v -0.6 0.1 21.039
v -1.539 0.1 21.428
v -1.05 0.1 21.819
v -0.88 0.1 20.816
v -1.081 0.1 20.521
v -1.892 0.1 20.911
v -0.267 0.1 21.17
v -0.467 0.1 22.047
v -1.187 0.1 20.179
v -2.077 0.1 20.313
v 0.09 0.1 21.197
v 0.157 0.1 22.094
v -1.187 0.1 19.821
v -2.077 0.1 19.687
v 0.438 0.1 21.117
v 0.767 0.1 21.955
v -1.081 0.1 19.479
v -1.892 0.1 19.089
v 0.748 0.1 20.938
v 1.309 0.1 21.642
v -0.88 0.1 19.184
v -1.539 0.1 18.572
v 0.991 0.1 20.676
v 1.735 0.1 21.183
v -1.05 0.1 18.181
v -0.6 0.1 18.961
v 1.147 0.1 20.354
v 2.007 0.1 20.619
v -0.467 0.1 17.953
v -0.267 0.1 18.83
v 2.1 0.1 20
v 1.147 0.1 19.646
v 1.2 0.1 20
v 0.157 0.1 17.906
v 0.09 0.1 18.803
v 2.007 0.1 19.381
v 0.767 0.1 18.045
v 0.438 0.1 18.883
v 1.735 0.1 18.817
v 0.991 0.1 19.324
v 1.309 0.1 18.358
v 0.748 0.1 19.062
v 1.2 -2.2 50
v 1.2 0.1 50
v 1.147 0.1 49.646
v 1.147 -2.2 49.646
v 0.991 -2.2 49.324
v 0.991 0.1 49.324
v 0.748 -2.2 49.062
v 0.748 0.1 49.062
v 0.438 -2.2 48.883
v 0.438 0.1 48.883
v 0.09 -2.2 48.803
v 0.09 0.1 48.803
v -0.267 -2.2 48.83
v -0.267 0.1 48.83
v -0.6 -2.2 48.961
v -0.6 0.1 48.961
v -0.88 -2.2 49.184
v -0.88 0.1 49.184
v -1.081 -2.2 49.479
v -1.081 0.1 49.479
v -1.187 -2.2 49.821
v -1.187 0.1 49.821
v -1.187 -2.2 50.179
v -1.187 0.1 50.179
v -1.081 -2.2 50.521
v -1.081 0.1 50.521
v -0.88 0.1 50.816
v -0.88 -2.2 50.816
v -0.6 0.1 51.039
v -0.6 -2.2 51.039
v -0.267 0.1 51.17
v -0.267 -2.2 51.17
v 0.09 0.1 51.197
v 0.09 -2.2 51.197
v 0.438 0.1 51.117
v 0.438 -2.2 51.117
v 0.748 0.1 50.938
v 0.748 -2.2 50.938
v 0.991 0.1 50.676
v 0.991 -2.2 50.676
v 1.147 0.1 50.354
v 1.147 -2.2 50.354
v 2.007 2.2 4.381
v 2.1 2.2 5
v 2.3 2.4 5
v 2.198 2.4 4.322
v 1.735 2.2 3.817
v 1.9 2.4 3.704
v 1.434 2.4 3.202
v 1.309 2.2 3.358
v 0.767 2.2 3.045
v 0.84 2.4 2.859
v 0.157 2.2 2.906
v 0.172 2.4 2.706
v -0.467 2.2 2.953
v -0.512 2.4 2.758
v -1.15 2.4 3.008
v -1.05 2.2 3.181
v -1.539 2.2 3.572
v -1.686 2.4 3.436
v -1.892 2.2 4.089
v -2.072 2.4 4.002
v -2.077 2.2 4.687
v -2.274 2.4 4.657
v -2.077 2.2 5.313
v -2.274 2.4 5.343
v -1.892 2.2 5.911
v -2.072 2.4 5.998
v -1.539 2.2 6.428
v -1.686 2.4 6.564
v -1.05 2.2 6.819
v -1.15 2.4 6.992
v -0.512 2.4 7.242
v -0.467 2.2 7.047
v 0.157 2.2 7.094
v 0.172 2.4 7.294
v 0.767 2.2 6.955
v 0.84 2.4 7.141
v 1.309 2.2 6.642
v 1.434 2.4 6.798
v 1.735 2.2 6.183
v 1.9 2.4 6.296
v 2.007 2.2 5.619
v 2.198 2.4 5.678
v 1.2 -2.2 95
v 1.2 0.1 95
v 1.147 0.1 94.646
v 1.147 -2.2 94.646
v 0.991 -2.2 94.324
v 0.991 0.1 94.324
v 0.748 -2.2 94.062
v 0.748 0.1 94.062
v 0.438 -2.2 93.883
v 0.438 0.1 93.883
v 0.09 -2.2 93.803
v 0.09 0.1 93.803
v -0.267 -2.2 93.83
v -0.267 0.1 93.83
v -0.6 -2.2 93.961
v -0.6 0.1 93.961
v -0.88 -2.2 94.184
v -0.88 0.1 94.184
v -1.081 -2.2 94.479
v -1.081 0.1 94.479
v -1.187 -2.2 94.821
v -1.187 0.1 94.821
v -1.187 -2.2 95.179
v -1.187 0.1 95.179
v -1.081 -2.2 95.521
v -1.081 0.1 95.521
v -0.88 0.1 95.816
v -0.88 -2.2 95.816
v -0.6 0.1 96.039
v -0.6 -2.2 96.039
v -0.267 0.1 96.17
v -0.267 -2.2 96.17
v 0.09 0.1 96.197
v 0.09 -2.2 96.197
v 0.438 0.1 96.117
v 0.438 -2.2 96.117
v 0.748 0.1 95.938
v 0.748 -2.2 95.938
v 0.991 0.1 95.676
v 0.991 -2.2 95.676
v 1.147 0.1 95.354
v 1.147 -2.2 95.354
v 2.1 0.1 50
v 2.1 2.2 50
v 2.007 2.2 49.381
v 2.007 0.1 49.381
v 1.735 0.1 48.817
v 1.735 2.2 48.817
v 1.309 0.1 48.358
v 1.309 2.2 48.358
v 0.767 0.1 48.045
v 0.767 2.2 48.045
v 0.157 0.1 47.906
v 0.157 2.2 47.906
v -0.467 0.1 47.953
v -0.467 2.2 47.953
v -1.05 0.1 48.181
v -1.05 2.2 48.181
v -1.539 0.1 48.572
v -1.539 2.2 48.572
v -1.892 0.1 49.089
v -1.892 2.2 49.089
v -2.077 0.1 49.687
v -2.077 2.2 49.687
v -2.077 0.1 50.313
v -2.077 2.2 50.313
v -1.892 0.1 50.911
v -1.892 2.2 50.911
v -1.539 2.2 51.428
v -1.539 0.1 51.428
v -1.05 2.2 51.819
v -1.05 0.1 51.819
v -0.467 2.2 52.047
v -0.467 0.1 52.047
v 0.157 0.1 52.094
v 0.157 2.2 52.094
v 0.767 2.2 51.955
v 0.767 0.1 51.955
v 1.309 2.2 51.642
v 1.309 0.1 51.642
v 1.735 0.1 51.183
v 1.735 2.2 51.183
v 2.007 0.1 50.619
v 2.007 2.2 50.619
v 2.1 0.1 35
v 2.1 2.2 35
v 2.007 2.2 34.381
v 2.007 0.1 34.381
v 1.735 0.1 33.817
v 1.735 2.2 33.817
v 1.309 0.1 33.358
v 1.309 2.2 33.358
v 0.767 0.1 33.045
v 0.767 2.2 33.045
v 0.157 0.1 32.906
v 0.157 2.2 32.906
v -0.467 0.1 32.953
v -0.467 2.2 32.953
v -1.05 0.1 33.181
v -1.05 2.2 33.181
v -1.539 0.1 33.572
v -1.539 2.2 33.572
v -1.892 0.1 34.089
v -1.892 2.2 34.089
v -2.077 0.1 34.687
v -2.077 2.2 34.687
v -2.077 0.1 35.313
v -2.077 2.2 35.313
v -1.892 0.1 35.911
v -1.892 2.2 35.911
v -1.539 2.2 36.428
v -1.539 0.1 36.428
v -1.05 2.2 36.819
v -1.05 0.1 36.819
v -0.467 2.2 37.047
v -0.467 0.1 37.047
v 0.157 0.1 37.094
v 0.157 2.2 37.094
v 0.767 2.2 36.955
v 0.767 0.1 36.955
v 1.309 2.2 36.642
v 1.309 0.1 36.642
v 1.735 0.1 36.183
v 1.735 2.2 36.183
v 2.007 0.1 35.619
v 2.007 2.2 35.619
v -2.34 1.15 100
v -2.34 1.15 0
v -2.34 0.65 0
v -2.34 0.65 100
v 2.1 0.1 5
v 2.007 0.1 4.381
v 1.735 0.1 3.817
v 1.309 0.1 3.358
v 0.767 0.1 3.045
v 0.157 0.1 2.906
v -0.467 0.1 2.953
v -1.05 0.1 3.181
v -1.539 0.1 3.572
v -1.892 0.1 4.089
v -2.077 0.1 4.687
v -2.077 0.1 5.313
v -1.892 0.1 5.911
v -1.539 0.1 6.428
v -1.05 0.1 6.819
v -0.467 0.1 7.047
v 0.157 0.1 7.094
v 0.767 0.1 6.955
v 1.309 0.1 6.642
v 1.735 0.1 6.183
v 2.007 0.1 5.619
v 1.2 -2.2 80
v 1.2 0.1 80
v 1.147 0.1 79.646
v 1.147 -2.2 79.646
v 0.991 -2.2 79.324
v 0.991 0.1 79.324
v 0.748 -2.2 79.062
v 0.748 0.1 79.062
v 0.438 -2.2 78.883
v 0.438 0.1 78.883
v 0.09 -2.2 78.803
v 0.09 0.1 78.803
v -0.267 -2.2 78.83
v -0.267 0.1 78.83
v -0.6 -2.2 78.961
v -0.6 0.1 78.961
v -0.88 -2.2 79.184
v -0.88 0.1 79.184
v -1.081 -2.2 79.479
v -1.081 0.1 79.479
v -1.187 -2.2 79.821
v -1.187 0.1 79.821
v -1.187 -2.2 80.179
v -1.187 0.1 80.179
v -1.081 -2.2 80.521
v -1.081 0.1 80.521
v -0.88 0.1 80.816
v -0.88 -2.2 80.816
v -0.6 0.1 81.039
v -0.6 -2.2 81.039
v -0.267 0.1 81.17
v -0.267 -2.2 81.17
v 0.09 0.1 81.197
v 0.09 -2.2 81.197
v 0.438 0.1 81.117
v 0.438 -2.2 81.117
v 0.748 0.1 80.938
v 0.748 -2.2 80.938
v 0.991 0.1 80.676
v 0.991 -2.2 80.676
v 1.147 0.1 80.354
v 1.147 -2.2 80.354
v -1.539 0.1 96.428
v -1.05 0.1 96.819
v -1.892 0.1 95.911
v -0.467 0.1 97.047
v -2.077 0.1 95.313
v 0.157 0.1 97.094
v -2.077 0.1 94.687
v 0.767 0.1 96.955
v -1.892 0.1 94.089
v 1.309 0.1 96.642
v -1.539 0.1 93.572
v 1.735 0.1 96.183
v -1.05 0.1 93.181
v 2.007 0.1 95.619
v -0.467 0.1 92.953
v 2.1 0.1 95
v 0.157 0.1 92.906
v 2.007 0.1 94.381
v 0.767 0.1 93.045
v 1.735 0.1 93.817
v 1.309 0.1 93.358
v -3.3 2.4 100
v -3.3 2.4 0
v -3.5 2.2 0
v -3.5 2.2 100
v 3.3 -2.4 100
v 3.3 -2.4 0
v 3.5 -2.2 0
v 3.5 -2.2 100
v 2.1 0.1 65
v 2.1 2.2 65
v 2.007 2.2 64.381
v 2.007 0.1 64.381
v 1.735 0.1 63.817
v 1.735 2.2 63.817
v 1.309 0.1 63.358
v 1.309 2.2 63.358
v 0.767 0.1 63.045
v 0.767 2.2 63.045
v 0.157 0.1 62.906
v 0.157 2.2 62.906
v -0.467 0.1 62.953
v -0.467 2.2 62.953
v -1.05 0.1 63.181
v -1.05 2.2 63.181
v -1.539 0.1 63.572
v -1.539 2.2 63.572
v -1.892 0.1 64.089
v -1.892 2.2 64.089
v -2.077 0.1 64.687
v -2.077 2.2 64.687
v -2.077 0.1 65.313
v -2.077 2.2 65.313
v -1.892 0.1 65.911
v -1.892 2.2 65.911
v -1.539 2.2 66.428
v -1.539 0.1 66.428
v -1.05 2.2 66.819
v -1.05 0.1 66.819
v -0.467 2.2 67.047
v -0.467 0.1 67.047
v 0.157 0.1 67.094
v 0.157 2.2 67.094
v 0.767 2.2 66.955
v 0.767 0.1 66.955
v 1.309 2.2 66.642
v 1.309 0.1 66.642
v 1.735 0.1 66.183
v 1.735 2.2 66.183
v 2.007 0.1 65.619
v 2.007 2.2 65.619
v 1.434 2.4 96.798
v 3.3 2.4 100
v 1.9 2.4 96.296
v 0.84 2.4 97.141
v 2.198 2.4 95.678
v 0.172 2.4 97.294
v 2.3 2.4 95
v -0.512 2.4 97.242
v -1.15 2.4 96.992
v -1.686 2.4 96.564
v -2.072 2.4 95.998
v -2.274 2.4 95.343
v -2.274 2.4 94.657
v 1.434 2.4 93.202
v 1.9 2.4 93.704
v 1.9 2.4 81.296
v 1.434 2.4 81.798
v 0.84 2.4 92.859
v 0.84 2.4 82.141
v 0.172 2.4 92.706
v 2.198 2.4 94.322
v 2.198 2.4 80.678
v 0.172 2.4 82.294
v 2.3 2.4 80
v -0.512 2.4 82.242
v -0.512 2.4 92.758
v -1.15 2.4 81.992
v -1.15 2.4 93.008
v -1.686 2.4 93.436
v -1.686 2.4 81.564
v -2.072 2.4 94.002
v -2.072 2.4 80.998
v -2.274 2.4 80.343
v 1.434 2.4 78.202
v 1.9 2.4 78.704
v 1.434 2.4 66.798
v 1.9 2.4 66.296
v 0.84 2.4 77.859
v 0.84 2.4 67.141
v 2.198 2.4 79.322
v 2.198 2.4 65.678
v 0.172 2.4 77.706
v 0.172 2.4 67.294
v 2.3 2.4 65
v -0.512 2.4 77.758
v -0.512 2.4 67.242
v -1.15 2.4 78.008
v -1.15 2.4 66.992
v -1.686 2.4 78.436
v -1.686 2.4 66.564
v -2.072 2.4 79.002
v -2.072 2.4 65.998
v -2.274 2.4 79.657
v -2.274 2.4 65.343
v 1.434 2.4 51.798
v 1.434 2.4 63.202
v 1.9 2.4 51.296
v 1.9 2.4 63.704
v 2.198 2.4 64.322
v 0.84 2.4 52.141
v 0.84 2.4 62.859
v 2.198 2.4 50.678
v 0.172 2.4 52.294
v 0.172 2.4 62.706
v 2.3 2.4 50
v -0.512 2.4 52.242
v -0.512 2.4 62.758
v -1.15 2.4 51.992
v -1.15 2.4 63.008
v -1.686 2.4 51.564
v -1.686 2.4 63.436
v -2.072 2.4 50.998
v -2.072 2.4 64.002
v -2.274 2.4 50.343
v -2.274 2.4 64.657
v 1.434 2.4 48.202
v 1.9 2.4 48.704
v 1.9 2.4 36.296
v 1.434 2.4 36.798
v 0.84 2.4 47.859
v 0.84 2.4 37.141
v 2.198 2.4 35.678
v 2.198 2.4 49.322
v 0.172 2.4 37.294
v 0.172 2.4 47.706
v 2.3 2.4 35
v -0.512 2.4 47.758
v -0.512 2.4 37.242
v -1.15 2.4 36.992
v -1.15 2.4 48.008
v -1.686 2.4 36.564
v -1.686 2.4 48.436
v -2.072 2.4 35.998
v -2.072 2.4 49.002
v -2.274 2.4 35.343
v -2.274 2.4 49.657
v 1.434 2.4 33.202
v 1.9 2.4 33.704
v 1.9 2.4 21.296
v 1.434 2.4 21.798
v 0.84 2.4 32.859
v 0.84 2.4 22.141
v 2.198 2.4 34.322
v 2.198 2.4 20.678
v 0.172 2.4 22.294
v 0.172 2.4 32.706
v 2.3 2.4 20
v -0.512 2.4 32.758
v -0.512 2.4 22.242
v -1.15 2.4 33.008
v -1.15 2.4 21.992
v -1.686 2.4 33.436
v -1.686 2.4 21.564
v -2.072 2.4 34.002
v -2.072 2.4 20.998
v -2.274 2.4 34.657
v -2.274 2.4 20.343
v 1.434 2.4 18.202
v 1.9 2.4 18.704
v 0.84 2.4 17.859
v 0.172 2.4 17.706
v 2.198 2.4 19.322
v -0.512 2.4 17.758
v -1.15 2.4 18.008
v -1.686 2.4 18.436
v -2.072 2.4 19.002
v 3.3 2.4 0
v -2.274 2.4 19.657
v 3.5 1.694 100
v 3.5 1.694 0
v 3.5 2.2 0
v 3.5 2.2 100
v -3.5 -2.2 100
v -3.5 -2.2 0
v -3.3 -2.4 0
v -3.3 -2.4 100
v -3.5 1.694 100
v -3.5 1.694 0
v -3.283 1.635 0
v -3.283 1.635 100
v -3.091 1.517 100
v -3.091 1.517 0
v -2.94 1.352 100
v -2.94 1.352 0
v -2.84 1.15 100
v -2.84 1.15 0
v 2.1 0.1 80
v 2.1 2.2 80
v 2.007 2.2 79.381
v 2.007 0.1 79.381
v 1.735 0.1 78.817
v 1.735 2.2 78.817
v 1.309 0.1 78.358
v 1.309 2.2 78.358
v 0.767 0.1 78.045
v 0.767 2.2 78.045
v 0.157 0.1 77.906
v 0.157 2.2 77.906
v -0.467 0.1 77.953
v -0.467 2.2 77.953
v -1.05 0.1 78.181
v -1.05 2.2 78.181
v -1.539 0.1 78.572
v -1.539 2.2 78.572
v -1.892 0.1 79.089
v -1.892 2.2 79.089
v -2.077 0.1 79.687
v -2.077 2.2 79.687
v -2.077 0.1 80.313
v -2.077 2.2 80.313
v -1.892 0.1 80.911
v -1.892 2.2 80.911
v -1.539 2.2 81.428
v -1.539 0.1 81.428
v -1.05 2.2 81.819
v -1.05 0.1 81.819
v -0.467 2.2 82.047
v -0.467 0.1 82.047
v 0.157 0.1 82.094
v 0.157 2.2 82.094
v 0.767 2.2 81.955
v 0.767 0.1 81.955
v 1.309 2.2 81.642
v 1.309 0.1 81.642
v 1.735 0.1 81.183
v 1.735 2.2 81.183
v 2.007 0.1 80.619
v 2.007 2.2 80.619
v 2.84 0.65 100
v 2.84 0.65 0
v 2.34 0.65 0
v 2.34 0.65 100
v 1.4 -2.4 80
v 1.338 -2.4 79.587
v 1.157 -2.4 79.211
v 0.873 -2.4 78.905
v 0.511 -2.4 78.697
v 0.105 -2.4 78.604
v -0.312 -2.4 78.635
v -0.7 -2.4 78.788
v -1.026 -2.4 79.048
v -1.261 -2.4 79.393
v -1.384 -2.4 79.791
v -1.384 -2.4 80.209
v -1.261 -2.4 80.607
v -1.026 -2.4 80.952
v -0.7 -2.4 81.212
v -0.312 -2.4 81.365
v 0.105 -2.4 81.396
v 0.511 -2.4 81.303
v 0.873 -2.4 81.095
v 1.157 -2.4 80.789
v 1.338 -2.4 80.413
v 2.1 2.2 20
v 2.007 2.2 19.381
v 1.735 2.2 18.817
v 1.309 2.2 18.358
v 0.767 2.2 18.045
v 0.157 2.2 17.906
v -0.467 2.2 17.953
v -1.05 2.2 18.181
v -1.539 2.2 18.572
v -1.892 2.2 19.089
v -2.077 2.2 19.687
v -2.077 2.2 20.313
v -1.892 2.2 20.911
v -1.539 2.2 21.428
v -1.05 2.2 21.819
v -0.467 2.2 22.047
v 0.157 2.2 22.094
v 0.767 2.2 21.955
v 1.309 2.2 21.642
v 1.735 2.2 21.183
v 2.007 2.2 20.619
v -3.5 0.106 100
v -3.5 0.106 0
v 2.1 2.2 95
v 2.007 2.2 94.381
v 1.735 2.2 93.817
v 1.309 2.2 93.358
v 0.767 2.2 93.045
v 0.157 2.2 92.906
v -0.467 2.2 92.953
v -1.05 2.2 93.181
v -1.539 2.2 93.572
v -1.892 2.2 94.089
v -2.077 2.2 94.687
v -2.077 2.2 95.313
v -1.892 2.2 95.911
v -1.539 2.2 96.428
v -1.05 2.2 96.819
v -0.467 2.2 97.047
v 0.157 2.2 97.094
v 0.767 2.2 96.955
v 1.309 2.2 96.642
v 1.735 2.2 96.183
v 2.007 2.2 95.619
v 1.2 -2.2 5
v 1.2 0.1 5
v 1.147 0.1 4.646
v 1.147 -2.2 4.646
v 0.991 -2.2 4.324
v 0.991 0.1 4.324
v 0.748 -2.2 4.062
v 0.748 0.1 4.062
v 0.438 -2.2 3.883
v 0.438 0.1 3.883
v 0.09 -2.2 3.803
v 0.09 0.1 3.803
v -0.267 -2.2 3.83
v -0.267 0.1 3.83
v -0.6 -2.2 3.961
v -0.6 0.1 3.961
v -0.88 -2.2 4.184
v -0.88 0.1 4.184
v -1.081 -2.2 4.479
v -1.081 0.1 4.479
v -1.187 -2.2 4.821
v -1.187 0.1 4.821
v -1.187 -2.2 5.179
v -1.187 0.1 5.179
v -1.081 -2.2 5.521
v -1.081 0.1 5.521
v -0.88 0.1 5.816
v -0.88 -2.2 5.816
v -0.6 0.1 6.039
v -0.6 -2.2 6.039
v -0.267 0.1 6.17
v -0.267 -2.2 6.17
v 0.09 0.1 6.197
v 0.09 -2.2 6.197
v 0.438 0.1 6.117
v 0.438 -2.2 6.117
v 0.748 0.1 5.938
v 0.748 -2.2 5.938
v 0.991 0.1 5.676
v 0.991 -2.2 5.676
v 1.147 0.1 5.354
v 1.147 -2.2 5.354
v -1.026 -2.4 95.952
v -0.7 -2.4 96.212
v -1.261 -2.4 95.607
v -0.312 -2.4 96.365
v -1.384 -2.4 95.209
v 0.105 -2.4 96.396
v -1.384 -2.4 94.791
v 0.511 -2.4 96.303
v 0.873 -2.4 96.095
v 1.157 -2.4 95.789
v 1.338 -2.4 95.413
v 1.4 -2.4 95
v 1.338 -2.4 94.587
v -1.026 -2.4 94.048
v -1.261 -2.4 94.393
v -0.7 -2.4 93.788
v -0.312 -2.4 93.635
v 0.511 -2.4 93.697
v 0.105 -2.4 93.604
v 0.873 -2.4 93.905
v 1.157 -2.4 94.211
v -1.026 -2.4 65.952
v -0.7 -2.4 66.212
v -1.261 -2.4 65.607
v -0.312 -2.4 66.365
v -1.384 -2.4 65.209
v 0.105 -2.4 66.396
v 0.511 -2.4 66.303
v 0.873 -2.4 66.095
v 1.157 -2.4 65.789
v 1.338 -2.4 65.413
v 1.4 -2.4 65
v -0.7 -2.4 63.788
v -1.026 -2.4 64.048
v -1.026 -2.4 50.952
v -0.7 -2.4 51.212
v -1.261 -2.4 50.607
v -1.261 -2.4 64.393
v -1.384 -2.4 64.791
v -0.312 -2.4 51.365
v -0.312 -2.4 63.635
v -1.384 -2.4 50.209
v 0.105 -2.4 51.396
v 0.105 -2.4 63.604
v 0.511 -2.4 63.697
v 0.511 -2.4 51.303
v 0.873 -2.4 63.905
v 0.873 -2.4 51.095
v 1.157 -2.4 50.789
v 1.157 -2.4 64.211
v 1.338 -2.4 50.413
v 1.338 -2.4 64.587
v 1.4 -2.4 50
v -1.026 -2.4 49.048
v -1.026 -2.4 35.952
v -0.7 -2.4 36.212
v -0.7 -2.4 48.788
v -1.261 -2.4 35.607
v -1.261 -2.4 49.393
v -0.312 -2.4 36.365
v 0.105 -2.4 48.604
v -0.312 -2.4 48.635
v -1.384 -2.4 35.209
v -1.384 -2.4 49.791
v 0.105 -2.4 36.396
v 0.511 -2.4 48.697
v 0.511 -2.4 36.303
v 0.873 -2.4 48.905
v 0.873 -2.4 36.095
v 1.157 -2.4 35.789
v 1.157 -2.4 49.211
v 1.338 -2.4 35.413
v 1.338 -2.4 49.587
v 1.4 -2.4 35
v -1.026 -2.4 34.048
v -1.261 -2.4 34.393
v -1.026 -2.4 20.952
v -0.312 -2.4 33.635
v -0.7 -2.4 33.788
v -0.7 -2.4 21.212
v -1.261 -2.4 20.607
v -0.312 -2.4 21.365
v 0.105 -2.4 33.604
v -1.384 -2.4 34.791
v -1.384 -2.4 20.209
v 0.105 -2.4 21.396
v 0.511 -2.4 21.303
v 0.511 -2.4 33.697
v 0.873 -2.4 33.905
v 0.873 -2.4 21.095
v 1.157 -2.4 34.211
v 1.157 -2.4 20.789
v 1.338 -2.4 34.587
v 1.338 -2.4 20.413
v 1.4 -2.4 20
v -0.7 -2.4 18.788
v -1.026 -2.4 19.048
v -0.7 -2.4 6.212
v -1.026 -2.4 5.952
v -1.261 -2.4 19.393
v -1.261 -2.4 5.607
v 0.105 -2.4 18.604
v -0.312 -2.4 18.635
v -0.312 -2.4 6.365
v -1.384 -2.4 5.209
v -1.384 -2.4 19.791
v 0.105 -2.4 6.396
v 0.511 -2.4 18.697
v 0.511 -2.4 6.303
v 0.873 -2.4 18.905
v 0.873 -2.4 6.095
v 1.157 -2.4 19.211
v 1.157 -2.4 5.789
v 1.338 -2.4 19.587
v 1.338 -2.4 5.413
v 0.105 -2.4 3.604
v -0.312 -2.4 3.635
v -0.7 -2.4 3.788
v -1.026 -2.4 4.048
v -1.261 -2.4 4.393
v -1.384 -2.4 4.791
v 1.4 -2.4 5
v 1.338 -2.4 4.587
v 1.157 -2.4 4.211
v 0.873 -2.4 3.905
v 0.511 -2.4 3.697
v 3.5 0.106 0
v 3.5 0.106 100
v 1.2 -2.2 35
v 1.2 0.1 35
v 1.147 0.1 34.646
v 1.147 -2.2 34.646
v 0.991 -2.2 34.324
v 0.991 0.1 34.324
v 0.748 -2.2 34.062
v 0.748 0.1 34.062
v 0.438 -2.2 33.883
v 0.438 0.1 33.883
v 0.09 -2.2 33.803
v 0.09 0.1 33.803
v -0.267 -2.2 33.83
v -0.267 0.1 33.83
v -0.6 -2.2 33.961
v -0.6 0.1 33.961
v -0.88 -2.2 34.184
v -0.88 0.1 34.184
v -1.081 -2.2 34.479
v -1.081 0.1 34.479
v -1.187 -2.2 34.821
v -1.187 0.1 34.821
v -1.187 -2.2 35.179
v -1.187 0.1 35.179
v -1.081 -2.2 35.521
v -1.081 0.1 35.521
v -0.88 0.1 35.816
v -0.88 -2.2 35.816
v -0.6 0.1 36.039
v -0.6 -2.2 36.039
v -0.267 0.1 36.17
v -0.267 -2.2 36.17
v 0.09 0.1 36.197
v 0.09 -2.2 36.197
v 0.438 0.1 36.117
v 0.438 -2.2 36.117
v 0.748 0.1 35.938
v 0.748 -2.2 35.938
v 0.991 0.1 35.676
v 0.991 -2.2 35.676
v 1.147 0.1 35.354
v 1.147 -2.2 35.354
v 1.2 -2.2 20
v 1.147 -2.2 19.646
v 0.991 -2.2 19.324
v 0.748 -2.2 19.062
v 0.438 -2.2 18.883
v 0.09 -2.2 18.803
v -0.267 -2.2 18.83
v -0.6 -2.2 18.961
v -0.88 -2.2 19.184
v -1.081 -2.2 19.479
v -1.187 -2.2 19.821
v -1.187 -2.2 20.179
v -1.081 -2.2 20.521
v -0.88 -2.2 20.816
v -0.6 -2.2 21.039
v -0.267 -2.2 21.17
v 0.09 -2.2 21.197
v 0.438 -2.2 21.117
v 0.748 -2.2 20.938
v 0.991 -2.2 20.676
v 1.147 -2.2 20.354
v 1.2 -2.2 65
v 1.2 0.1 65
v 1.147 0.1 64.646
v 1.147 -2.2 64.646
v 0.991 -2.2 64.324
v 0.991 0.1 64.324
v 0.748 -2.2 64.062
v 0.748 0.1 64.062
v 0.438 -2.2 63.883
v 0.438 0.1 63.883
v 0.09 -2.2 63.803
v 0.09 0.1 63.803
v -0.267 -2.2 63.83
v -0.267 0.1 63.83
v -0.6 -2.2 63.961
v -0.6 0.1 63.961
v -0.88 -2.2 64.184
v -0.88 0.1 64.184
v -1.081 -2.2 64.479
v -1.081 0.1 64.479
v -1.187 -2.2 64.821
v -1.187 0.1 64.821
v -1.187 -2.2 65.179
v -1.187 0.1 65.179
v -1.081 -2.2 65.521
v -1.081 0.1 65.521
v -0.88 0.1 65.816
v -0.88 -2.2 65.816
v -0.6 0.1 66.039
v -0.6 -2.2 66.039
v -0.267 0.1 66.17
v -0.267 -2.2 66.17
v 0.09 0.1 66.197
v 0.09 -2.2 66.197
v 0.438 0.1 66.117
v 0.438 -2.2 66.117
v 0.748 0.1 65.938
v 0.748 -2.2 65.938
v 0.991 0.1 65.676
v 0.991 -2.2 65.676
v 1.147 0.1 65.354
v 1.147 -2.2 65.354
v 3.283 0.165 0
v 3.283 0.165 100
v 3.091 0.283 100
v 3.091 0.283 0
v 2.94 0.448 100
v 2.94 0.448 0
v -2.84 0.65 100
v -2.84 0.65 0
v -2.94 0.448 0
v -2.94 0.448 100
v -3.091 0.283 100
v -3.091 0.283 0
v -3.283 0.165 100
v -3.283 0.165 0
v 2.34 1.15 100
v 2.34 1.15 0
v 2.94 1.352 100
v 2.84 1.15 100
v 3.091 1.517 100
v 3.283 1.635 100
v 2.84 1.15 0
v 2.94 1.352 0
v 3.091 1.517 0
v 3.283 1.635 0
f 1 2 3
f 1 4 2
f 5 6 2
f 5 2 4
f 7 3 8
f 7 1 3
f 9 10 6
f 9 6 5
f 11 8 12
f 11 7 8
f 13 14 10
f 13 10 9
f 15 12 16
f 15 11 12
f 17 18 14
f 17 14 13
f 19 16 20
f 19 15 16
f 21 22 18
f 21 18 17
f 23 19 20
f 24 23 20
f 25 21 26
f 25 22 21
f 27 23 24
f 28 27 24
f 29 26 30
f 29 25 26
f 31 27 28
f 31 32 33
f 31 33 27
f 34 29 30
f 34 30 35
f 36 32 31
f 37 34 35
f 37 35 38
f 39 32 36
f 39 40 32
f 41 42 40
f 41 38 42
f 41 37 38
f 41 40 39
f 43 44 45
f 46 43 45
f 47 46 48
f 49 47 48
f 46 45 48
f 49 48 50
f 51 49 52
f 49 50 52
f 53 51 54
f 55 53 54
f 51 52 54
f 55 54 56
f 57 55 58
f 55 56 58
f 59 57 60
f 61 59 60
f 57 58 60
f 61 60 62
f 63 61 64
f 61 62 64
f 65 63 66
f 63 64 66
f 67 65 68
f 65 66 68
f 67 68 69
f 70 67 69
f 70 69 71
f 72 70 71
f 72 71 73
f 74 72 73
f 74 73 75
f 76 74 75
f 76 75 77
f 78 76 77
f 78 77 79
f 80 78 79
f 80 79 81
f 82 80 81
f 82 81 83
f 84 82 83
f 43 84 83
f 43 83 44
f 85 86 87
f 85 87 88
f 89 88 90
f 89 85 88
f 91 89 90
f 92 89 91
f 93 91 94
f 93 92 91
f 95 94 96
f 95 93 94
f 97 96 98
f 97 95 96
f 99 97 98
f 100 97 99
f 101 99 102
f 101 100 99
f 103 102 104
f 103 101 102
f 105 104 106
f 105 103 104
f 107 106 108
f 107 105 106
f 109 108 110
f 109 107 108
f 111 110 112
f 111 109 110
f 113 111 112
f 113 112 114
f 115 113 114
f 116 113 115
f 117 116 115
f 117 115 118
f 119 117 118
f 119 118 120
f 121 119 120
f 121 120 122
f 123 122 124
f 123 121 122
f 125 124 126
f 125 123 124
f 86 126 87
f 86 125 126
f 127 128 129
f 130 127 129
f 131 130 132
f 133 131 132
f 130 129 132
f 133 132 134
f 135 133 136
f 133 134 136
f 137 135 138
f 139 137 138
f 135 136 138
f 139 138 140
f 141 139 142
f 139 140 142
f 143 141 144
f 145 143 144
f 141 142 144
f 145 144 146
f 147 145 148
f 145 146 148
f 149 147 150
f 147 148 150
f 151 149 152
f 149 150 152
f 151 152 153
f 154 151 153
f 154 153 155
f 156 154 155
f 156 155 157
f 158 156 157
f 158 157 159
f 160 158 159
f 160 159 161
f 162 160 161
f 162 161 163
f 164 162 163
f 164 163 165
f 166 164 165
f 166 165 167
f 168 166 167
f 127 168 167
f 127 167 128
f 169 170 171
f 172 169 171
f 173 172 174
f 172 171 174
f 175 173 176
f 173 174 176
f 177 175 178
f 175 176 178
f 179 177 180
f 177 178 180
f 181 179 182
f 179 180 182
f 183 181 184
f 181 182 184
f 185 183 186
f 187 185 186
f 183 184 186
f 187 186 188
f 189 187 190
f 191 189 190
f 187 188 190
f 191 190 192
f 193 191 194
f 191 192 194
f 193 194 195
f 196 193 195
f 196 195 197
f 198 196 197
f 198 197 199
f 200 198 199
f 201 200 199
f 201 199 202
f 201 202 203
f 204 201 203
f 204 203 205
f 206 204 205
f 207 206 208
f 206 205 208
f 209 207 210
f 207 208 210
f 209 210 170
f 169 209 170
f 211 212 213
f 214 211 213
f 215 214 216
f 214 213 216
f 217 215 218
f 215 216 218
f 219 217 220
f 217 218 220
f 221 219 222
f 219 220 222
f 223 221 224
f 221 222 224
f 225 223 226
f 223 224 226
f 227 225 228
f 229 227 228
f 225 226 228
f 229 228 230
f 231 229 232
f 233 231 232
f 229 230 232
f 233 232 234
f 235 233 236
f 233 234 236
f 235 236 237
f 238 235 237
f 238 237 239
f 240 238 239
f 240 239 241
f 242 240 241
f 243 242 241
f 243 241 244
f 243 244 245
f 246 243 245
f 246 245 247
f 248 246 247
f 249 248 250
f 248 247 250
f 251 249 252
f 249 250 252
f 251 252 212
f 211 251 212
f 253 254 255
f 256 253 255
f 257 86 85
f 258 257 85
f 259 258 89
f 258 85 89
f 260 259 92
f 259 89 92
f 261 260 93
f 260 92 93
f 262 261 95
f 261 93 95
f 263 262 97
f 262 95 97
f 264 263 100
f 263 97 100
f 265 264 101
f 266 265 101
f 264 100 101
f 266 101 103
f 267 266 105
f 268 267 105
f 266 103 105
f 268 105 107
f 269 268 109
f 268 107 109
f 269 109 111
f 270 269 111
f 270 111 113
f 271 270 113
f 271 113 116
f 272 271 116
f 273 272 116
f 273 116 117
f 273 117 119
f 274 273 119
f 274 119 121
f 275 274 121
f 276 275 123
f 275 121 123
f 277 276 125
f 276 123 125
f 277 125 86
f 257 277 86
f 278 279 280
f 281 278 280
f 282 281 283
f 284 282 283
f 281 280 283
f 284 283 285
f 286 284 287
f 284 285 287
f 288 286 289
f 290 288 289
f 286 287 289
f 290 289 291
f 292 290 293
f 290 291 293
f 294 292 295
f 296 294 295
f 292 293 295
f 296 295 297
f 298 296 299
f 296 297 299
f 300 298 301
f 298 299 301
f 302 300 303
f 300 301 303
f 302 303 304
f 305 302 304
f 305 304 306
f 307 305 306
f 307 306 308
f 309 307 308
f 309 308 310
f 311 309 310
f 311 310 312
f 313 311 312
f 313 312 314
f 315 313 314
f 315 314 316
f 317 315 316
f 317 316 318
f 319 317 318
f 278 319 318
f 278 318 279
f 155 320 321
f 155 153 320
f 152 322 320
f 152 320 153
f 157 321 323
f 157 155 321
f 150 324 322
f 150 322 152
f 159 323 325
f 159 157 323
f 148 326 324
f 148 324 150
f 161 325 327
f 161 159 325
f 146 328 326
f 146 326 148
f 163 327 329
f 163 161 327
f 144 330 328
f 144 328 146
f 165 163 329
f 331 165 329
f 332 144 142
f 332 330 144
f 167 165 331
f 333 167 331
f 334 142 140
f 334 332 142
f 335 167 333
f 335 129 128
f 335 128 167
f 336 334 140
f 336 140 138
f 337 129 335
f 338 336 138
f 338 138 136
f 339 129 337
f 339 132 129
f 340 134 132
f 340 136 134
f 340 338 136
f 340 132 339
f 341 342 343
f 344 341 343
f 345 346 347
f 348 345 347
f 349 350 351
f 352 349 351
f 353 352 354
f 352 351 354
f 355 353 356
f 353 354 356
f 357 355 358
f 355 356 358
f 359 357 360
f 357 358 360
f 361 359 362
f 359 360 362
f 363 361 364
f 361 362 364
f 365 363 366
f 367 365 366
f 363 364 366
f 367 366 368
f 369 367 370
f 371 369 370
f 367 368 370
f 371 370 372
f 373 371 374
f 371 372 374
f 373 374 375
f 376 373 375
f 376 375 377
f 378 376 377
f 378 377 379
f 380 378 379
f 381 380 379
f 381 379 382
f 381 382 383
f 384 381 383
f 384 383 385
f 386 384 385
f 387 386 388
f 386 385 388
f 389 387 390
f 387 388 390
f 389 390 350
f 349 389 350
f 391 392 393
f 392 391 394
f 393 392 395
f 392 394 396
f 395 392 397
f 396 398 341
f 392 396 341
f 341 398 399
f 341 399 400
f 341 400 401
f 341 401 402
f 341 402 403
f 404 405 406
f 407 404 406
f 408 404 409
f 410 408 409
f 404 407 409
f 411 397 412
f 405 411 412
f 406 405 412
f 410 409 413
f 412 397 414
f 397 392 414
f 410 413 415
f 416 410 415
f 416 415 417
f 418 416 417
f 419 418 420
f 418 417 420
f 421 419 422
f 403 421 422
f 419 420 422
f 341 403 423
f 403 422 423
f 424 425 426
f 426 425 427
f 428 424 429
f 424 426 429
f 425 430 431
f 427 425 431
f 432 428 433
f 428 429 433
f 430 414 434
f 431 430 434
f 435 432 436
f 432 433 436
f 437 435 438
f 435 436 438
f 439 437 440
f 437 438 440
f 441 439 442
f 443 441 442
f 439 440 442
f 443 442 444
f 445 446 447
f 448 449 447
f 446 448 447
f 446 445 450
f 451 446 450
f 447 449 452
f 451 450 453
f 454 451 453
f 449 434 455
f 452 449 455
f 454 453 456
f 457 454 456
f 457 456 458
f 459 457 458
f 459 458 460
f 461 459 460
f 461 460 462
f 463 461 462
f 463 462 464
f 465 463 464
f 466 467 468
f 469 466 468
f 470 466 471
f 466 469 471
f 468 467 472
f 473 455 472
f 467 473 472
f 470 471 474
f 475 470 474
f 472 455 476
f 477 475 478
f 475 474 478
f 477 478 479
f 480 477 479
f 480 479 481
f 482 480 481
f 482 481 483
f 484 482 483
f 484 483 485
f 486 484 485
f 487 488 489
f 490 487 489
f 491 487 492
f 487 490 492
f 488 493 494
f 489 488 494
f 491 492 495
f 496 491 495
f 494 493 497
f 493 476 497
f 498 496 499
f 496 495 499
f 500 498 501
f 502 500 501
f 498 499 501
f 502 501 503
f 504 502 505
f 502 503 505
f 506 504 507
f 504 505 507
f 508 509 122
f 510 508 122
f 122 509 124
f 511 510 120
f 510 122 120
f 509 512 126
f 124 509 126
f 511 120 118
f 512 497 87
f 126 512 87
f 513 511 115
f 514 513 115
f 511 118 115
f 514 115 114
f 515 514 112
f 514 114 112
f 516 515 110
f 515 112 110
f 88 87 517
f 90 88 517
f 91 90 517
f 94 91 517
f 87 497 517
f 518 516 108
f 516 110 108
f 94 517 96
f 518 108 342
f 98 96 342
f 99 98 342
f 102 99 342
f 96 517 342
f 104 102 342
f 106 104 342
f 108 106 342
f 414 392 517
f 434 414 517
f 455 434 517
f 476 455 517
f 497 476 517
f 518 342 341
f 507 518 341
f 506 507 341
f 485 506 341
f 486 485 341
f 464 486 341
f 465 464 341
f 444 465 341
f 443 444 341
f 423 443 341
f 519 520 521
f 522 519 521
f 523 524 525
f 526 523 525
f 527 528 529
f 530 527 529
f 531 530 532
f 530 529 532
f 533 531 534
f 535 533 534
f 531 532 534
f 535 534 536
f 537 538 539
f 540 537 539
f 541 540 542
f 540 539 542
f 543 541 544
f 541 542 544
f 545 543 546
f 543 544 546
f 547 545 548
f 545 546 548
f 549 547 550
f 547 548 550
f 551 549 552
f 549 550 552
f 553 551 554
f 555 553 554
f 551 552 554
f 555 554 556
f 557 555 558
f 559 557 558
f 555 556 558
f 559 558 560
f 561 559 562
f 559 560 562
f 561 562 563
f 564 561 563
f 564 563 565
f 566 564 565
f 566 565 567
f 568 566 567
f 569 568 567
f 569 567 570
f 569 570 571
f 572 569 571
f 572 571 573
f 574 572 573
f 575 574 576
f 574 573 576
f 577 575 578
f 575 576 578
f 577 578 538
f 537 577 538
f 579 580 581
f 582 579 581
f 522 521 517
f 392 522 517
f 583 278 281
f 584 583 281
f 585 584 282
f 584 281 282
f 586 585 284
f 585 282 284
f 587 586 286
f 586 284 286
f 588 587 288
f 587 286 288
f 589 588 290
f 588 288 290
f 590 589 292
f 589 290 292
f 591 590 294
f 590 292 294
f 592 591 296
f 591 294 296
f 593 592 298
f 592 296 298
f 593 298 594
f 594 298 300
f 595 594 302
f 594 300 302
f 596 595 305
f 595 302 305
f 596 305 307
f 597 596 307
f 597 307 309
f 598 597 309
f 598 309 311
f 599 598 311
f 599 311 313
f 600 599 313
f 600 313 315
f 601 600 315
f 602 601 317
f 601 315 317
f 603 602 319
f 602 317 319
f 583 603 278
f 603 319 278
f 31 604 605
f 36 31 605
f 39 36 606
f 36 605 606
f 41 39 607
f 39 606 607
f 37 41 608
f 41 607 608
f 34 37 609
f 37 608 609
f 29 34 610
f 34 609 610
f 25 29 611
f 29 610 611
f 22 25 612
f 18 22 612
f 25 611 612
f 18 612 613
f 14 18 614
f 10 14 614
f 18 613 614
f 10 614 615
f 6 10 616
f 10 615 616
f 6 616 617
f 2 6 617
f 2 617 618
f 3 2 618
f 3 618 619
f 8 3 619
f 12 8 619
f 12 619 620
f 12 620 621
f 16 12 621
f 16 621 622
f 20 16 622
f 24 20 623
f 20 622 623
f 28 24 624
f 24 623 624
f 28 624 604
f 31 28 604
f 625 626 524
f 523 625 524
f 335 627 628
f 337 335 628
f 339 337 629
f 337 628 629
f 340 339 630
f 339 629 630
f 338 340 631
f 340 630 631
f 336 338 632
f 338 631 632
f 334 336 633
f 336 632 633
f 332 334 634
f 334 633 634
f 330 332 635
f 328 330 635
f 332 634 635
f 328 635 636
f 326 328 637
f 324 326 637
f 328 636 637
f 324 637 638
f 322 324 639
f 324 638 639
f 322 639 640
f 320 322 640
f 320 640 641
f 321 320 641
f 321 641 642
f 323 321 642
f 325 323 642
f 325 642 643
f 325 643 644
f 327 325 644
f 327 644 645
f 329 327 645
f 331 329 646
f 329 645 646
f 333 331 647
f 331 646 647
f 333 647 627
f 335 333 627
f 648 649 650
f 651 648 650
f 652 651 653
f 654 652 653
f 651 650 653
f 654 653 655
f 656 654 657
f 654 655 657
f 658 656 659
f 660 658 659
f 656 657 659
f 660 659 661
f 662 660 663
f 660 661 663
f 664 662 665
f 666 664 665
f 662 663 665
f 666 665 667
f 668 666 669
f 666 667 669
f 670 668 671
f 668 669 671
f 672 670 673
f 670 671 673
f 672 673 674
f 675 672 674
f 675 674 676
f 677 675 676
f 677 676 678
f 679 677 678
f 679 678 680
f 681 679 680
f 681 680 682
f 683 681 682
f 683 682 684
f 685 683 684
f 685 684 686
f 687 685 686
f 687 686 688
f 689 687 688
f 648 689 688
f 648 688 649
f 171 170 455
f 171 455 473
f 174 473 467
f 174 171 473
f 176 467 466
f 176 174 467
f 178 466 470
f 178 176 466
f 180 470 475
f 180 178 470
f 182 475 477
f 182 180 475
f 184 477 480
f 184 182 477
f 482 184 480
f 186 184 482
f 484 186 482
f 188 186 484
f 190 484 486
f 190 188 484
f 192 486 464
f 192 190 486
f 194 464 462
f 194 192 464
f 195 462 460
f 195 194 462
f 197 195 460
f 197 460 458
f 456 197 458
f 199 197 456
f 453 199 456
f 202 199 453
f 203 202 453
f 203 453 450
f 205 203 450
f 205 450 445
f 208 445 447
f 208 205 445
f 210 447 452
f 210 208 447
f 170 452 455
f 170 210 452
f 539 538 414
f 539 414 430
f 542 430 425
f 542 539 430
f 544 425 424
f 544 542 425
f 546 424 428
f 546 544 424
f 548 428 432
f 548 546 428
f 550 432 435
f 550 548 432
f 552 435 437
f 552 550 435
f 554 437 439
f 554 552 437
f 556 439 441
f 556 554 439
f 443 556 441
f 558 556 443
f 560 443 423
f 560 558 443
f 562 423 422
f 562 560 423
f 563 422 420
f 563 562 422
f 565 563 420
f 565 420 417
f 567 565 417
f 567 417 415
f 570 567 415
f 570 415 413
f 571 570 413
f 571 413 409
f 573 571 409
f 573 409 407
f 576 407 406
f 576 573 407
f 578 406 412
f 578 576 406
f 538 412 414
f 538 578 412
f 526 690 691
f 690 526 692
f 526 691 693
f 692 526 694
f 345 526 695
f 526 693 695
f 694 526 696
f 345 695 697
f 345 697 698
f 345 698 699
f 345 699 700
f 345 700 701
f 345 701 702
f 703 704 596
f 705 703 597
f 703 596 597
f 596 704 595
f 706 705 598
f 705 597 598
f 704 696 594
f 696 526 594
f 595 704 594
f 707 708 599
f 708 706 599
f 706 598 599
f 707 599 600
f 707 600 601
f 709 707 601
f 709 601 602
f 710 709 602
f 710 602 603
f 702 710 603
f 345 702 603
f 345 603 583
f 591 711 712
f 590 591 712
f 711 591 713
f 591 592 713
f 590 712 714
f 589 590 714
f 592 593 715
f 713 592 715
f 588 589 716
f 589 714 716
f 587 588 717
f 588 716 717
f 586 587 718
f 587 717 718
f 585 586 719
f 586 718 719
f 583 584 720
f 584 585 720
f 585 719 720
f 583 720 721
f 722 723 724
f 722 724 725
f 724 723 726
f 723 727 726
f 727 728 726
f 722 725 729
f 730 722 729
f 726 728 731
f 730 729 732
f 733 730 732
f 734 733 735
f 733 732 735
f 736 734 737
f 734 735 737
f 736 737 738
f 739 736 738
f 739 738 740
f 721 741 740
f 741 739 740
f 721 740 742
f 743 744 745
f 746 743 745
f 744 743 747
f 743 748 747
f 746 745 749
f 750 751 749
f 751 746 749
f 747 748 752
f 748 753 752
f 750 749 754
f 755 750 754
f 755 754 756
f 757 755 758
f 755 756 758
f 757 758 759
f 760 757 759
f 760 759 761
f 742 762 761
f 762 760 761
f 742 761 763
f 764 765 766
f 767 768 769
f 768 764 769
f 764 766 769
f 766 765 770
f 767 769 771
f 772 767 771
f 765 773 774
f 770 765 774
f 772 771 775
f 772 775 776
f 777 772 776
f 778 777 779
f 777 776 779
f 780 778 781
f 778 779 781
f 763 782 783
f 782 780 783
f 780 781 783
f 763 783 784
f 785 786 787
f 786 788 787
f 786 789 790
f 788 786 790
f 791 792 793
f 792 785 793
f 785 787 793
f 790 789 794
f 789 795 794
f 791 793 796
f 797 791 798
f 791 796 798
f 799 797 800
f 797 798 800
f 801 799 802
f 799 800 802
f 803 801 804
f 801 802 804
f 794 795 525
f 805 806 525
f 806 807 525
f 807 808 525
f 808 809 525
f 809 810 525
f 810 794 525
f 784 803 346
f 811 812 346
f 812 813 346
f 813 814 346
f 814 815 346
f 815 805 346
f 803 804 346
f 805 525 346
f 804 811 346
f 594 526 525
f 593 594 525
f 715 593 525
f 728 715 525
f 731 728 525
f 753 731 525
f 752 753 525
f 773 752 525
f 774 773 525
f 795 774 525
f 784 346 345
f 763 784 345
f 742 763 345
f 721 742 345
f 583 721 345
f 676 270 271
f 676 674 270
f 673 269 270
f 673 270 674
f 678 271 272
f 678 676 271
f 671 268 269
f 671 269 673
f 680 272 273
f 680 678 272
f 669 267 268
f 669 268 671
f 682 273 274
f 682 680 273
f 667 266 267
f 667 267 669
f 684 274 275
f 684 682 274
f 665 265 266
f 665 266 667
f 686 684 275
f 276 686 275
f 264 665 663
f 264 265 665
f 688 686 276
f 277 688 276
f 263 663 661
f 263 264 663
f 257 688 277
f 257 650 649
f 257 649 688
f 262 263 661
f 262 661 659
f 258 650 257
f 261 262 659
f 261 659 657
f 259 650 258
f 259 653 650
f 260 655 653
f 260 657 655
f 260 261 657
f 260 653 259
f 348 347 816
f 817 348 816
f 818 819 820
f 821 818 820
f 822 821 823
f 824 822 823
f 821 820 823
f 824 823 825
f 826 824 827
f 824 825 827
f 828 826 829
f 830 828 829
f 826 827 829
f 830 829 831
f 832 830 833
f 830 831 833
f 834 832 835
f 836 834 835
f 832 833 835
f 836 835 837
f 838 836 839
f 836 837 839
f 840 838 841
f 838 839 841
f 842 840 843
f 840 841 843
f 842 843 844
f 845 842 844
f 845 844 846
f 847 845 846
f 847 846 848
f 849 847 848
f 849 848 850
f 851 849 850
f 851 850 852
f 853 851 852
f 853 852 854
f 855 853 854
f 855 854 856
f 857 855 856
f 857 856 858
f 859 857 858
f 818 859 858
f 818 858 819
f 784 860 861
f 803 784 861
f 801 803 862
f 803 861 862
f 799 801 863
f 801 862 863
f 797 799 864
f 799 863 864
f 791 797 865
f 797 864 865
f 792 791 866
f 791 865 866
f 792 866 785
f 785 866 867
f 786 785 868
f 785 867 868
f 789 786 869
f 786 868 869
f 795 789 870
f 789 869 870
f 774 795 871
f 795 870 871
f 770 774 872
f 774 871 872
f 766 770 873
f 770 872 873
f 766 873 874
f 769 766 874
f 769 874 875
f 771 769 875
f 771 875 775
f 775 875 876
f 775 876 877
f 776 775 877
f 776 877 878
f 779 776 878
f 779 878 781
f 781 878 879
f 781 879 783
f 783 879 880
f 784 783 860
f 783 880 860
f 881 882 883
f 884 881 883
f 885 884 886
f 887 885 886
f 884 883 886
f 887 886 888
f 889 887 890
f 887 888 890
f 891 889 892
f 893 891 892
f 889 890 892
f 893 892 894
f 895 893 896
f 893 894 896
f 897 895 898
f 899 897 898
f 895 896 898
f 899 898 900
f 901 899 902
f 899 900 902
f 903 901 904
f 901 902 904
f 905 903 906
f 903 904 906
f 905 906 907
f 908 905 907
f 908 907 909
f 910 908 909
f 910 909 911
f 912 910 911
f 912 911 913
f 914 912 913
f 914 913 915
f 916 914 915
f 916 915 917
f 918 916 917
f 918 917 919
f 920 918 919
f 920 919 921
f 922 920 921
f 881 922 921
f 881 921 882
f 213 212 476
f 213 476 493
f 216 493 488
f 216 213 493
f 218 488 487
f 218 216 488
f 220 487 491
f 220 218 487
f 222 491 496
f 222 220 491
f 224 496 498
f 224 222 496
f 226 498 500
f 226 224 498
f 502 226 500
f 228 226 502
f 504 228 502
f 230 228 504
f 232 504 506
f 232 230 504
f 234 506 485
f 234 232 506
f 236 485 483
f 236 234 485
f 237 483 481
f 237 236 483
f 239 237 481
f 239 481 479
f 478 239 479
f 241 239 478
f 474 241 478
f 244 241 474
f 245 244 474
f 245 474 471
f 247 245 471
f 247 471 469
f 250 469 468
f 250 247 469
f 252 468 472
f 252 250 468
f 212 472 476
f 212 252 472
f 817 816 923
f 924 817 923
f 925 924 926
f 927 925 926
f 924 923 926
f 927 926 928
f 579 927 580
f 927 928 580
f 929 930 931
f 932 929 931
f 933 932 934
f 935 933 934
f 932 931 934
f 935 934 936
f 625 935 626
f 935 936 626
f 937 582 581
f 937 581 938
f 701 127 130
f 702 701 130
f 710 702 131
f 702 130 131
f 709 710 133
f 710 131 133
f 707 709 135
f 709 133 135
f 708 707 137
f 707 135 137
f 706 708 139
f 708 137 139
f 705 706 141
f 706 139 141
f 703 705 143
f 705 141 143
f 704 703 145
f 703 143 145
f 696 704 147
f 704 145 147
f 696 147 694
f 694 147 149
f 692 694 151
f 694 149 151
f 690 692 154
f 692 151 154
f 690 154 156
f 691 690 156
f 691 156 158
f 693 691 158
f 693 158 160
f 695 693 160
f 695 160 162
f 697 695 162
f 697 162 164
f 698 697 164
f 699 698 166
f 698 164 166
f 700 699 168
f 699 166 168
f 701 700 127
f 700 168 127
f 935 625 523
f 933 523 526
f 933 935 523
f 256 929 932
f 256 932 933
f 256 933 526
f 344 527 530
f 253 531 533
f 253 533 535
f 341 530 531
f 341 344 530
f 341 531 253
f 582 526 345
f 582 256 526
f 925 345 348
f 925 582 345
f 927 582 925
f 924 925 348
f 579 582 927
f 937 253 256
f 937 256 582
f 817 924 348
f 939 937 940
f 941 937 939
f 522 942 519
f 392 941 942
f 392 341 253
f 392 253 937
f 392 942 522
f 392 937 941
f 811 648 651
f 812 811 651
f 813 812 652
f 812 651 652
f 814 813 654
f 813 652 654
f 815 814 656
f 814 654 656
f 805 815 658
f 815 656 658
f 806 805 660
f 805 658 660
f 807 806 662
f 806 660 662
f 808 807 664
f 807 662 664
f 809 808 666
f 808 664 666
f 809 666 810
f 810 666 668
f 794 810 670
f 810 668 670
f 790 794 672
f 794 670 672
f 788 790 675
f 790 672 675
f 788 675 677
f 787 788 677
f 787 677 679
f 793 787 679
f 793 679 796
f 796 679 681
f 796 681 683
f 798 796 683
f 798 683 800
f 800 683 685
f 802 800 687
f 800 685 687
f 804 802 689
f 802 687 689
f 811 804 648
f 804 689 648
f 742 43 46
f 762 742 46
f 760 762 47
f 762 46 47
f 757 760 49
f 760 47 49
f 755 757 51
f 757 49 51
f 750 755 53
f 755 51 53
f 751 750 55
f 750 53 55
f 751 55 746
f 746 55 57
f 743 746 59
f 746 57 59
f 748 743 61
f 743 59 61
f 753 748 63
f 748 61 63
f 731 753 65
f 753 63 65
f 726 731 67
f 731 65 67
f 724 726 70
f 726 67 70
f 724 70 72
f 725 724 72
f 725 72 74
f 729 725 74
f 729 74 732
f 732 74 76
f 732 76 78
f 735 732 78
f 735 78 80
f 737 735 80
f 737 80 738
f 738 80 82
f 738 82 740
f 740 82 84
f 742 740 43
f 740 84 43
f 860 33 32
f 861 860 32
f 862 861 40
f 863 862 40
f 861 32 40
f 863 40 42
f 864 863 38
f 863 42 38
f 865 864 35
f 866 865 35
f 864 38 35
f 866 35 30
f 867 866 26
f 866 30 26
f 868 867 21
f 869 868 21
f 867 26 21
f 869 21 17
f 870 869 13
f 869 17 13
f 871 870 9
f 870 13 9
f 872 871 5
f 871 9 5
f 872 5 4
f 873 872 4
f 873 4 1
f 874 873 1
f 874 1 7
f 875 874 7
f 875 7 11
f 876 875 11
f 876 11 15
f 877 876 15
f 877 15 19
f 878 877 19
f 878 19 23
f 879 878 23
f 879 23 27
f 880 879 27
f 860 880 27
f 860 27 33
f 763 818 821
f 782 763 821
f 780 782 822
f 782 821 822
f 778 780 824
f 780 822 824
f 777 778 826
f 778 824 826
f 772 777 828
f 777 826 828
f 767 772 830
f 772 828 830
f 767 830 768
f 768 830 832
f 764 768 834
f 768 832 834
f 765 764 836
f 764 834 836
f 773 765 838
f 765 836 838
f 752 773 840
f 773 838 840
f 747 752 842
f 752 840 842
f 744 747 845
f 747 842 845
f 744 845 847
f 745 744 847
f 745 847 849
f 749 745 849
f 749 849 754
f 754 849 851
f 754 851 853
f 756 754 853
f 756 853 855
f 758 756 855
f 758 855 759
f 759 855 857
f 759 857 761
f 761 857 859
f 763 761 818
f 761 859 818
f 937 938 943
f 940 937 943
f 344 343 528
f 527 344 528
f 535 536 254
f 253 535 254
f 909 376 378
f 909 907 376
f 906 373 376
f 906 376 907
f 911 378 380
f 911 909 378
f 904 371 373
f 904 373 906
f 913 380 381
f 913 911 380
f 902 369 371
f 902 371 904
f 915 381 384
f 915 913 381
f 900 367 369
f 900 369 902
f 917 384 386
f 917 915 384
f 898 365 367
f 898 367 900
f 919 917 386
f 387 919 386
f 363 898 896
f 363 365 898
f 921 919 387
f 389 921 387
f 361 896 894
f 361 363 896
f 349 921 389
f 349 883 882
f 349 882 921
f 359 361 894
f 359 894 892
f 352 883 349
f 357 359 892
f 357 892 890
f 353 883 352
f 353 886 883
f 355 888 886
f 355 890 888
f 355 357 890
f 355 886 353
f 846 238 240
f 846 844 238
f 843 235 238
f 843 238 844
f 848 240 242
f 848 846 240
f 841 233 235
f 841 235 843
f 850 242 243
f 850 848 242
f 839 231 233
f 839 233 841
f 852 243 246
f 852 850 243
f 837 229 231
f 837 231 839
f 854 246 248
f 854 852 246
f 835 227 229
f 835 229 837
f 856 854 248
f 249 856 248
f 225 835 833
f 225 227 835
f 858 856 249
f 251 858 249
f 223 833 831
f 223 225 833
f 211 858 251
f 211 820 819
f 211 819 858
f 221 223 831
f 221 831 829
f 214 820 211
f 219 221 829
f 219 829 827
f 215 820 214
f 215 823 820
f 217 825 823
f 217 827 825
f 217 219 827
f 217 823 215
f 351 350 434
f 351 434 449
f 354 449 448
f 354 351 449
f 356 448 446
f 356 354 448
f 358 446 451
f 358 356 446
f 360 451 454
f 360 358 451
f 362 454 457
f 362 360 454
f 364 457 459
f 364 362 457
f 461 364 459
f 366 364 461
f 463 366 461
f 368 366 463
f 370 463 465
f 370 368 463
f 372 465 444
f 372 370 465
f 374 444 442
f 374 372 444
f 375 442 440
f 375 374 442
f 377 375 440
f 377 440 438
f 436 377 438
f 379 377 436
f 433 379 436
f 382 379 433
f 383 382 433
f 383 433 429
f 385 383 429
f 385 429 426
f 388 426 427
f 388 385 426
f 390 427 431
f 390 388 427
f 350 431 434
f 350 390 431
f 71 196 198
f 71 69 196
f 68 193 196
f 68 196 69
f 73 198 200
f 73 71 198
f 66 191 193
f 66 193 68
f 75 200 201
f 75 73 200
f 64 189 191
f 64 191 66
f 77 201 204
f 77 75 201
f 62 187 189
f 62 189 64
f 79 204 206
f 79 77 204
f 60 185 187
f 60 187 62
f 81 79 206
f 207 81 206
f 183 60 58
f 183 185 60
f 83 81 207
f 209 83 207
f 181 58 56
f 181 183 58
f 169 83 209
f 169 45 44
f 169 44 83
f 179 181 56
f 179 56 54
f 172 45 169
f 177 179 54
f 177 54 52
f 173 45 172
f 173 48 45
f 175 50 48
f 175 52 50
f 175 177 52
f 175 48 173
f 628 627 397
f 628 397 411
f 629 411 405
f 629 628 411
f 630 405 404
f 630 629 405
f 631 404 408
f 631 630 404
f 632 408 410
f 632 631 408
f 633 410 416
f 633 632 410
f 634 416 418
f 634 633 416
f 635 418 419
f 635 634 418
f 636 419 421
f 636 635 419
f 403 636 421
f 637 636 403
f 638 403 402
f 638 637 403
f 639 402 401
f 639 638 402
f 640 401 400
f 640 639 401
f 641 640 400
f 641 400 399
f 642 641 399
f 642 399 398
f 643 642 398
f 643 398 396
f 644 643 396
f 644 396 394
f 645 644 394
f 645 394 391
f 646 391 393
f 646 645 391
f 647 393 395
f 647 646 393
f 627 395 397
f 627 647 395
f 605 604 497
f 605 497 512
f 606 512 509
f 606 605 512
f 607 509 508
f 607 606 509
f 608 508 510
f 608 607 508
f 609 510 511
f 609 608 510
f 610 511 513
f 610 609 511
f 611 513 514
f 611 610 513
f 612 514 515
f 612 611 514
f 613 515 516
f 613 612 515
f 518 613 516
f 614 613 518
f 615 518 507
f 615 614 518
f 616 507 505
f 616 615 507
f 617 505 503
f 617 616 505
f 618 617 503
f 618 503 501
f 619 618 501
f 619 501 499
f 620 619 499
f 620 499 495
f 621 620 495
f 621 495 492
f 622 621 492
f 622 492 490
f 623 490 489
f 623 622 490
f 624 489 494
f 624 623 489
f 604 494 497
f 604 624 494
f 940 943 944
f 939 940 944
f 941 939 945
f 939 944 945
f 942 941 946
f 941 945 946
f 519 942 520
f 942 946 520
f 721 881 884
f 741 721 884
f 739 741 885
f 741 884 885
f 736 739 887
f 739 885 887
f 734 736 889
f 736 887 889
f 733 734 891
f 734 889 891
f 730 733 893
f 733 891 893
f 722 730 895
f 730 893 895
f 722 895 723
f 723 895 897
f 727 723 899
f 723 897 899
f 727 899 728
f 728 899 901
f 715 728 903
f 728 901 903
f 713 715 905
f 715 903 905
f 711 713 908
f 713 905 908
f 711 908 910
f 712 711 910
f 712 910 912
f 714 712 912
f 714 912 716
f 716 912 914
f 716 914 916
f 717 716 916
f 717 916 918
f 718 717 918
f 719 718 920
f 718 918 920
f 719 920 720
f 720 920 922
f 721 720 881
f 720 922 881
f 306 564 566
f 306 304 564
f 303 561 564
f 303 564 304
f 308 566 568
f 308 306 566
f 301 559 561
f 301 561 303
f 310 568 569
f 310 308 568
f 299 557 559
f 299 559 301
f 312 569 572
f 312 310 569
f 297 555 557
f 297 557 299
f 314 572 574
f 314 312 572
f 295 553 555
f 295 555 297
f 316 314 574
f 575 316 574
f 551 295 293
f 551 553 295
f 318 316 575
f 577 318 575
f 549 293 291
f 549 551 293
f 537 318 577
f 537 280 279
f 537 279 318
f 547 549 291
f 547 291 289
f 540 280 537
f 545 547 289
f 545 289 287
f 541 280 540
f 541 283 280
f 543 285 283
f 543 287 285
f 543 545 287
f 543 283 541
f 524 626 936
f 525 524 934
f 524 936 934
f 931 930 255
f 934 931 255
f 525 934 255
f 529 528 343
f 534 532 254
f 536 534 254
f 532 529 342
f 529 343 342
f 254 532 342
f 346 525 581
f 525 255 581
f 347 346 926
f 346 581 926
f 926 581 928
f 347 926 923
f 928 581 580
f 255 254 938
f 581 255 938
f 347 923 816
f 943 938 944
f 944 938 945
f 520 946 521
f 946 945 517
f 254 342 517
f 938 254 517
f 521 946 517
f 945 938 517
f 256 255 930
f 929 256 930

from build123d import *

# Parameters (mm, degrees)
EXTRUDE1_DEPTH             = 100
EXTRUDE2_REACH             = 102.176
SKETCH2_R                  = 1.2
SKETCH_R                   = 2.1
SKETCH_R_2                 = 1.2
EXTRUDE4_DEPTH             = 2.3
CHAMFER1_SIZE              = 0.2
LPATTERN1_COUNT            = 7
LPATTERN1_PITCH            = 15
CHAMFER1_OF_LPATTERN1_SIZE = 0.2


with BuildPart() as part:
    # Sketch1 → Extrude1 (new body)
    with BuildSketch(Plane.XY):
        with BuildLine():
            Line((-3.3, -2.4), (3.3, -2.4))
            Line((3.3, -2.4), (3.5, -2.2))
            Line((3.5, -2.2), (3.5, 0.106274607))
            ThreePointArc((3.5, 0.106274607), (3.091294745, 0.282570681), (2.840065792, 0.65))
            Line((2.840065792, 0.65), (2.340065792, 0.65))
            Line((2.340065792, 0.65), (2.340065792, 1.15))
            Line((2.340065792, 1.15), (2.840065792, 1.15))
            ThreePointArc((2.840065792, 1.15), (3.091294745, 1.517429319), (3.5, 1.693725393))
            Line((3.5, 1.693725393), (3.5, 2.2))
            Line((3.5, 2.2), (3.3, 2.4))
            Line((3.3, 2.4), (-3.3, 2.4))
            Line((-3.3, 2.4), (-3.5, 2.2))
            Line((-3.5, 2.2), (-3.5, 1.693725393))
            ThreePointArc((-3.5, 1.693725393), (-3.091294745, 1.517429319), (-2.840065792, 1.15))
            Line((-2.840065792, 1.15), (-2.340065792, 1.15))
            Line((-2.340065792, 1.15), (-2.340065792, 0.65))
            Line((-2.340065792, 0.65), (-2.840065792, 0.65))
            ThreePointArc((-2.840065792, 0.65), (-3.091294745, 0.282570681), (-3.5, 0.106274607))
            Line((-3.5, 0.106274607), (-3.5, -2.2))
            Line((-3.5, -2.2), (-3.3, -2.4))
        make_face()
    extrude(amount=EXTRUDE1_DEPTH)

    # Sketch2 → Extrude2 (cut, up to next)
    with BuildSketch(Plane(origin=(0, 2.4, 0), x_dir=(1, 0, 0), z_dir=(0, 1, 0)), mode=Mode.PRIVATE) as extrude2_sk1:
        with Locations((0, -5)):
            Circle(SKETCH2_R)
    extrude2_tool1 = extrude(extrude2_sk1.sketch, amount=-EXTRUDE2_REACH, mode=Mode.PRIVATE) & part.part
    extrude2 = extrude2_tool1.solids().sort_by_distance((0, 2.4, 5))[0]
    add(extrude2, mode=Mode.SUBTRACT)

    # Sketch → Extrude4 (cut)
    with BuildSketch(Plane(origin=(0, 2.4, 0), x_dir=(1, 0, 0), z_dir=(0, 1, 0))):
        with Locations((0, -5)):
            Circle(SKETCH_R)
        with Locations((0, -5)):
            Circle(SKETCH_R_2, mode=Mode.SUBTRACT)
    extrude4 = extrude(amount=-EXTRUDE4_DEPTH, mode=Mode.SUBTRACT)

    # Chamfer1
    chamfer1_edges = [part.edges().sort_by_distance(p)[0] for p in [
        (-1.2, -2.4, 5),
        (-2.1, 2.4, 5),
    ]]
    chamfer(chamfer1_edges, length=CHAMFER1_SIZE)

    # LPattern1: Extrude2, Extrude4 ×7
    with Locations(*[(0, 0, i * LPATTERN1_PITCH) for i in range(1, LPATTERN1_COUNT)]):
        add(extrude2, mode=Mode.SUBTRACT)
        add(extrude4, mode=Mode.SUBTRACT)

    # Chamfer1 of LPattern1
    chamfer1_of_lpattern1_edges = [part.edges().sort_by_distance(p)[0] for p in [
        (-1.2, -2.4, 20),
        (-2.1, 2.4, 20),
        (-1.2, -2.4, 35),
        (-2.1, 2.4, 35),
        (-1.2, -2.4, 50),
        (-2.1, 2.4, 50),
        (-1.2, -2.4, 65),
        (-2.1, 2.4, 65),
        (-1.2, -2.4, 80),
        (-2.1, 2.4, 80),
        (-1.2, -2.4, 95),
        (-2.1, 2.4, 95),
    ]]
    chamfer(chamfer1_of_lpattern1_edges, length=CHAMFER1_OF_LPATTERN1_SIZE)


solid = part.part
